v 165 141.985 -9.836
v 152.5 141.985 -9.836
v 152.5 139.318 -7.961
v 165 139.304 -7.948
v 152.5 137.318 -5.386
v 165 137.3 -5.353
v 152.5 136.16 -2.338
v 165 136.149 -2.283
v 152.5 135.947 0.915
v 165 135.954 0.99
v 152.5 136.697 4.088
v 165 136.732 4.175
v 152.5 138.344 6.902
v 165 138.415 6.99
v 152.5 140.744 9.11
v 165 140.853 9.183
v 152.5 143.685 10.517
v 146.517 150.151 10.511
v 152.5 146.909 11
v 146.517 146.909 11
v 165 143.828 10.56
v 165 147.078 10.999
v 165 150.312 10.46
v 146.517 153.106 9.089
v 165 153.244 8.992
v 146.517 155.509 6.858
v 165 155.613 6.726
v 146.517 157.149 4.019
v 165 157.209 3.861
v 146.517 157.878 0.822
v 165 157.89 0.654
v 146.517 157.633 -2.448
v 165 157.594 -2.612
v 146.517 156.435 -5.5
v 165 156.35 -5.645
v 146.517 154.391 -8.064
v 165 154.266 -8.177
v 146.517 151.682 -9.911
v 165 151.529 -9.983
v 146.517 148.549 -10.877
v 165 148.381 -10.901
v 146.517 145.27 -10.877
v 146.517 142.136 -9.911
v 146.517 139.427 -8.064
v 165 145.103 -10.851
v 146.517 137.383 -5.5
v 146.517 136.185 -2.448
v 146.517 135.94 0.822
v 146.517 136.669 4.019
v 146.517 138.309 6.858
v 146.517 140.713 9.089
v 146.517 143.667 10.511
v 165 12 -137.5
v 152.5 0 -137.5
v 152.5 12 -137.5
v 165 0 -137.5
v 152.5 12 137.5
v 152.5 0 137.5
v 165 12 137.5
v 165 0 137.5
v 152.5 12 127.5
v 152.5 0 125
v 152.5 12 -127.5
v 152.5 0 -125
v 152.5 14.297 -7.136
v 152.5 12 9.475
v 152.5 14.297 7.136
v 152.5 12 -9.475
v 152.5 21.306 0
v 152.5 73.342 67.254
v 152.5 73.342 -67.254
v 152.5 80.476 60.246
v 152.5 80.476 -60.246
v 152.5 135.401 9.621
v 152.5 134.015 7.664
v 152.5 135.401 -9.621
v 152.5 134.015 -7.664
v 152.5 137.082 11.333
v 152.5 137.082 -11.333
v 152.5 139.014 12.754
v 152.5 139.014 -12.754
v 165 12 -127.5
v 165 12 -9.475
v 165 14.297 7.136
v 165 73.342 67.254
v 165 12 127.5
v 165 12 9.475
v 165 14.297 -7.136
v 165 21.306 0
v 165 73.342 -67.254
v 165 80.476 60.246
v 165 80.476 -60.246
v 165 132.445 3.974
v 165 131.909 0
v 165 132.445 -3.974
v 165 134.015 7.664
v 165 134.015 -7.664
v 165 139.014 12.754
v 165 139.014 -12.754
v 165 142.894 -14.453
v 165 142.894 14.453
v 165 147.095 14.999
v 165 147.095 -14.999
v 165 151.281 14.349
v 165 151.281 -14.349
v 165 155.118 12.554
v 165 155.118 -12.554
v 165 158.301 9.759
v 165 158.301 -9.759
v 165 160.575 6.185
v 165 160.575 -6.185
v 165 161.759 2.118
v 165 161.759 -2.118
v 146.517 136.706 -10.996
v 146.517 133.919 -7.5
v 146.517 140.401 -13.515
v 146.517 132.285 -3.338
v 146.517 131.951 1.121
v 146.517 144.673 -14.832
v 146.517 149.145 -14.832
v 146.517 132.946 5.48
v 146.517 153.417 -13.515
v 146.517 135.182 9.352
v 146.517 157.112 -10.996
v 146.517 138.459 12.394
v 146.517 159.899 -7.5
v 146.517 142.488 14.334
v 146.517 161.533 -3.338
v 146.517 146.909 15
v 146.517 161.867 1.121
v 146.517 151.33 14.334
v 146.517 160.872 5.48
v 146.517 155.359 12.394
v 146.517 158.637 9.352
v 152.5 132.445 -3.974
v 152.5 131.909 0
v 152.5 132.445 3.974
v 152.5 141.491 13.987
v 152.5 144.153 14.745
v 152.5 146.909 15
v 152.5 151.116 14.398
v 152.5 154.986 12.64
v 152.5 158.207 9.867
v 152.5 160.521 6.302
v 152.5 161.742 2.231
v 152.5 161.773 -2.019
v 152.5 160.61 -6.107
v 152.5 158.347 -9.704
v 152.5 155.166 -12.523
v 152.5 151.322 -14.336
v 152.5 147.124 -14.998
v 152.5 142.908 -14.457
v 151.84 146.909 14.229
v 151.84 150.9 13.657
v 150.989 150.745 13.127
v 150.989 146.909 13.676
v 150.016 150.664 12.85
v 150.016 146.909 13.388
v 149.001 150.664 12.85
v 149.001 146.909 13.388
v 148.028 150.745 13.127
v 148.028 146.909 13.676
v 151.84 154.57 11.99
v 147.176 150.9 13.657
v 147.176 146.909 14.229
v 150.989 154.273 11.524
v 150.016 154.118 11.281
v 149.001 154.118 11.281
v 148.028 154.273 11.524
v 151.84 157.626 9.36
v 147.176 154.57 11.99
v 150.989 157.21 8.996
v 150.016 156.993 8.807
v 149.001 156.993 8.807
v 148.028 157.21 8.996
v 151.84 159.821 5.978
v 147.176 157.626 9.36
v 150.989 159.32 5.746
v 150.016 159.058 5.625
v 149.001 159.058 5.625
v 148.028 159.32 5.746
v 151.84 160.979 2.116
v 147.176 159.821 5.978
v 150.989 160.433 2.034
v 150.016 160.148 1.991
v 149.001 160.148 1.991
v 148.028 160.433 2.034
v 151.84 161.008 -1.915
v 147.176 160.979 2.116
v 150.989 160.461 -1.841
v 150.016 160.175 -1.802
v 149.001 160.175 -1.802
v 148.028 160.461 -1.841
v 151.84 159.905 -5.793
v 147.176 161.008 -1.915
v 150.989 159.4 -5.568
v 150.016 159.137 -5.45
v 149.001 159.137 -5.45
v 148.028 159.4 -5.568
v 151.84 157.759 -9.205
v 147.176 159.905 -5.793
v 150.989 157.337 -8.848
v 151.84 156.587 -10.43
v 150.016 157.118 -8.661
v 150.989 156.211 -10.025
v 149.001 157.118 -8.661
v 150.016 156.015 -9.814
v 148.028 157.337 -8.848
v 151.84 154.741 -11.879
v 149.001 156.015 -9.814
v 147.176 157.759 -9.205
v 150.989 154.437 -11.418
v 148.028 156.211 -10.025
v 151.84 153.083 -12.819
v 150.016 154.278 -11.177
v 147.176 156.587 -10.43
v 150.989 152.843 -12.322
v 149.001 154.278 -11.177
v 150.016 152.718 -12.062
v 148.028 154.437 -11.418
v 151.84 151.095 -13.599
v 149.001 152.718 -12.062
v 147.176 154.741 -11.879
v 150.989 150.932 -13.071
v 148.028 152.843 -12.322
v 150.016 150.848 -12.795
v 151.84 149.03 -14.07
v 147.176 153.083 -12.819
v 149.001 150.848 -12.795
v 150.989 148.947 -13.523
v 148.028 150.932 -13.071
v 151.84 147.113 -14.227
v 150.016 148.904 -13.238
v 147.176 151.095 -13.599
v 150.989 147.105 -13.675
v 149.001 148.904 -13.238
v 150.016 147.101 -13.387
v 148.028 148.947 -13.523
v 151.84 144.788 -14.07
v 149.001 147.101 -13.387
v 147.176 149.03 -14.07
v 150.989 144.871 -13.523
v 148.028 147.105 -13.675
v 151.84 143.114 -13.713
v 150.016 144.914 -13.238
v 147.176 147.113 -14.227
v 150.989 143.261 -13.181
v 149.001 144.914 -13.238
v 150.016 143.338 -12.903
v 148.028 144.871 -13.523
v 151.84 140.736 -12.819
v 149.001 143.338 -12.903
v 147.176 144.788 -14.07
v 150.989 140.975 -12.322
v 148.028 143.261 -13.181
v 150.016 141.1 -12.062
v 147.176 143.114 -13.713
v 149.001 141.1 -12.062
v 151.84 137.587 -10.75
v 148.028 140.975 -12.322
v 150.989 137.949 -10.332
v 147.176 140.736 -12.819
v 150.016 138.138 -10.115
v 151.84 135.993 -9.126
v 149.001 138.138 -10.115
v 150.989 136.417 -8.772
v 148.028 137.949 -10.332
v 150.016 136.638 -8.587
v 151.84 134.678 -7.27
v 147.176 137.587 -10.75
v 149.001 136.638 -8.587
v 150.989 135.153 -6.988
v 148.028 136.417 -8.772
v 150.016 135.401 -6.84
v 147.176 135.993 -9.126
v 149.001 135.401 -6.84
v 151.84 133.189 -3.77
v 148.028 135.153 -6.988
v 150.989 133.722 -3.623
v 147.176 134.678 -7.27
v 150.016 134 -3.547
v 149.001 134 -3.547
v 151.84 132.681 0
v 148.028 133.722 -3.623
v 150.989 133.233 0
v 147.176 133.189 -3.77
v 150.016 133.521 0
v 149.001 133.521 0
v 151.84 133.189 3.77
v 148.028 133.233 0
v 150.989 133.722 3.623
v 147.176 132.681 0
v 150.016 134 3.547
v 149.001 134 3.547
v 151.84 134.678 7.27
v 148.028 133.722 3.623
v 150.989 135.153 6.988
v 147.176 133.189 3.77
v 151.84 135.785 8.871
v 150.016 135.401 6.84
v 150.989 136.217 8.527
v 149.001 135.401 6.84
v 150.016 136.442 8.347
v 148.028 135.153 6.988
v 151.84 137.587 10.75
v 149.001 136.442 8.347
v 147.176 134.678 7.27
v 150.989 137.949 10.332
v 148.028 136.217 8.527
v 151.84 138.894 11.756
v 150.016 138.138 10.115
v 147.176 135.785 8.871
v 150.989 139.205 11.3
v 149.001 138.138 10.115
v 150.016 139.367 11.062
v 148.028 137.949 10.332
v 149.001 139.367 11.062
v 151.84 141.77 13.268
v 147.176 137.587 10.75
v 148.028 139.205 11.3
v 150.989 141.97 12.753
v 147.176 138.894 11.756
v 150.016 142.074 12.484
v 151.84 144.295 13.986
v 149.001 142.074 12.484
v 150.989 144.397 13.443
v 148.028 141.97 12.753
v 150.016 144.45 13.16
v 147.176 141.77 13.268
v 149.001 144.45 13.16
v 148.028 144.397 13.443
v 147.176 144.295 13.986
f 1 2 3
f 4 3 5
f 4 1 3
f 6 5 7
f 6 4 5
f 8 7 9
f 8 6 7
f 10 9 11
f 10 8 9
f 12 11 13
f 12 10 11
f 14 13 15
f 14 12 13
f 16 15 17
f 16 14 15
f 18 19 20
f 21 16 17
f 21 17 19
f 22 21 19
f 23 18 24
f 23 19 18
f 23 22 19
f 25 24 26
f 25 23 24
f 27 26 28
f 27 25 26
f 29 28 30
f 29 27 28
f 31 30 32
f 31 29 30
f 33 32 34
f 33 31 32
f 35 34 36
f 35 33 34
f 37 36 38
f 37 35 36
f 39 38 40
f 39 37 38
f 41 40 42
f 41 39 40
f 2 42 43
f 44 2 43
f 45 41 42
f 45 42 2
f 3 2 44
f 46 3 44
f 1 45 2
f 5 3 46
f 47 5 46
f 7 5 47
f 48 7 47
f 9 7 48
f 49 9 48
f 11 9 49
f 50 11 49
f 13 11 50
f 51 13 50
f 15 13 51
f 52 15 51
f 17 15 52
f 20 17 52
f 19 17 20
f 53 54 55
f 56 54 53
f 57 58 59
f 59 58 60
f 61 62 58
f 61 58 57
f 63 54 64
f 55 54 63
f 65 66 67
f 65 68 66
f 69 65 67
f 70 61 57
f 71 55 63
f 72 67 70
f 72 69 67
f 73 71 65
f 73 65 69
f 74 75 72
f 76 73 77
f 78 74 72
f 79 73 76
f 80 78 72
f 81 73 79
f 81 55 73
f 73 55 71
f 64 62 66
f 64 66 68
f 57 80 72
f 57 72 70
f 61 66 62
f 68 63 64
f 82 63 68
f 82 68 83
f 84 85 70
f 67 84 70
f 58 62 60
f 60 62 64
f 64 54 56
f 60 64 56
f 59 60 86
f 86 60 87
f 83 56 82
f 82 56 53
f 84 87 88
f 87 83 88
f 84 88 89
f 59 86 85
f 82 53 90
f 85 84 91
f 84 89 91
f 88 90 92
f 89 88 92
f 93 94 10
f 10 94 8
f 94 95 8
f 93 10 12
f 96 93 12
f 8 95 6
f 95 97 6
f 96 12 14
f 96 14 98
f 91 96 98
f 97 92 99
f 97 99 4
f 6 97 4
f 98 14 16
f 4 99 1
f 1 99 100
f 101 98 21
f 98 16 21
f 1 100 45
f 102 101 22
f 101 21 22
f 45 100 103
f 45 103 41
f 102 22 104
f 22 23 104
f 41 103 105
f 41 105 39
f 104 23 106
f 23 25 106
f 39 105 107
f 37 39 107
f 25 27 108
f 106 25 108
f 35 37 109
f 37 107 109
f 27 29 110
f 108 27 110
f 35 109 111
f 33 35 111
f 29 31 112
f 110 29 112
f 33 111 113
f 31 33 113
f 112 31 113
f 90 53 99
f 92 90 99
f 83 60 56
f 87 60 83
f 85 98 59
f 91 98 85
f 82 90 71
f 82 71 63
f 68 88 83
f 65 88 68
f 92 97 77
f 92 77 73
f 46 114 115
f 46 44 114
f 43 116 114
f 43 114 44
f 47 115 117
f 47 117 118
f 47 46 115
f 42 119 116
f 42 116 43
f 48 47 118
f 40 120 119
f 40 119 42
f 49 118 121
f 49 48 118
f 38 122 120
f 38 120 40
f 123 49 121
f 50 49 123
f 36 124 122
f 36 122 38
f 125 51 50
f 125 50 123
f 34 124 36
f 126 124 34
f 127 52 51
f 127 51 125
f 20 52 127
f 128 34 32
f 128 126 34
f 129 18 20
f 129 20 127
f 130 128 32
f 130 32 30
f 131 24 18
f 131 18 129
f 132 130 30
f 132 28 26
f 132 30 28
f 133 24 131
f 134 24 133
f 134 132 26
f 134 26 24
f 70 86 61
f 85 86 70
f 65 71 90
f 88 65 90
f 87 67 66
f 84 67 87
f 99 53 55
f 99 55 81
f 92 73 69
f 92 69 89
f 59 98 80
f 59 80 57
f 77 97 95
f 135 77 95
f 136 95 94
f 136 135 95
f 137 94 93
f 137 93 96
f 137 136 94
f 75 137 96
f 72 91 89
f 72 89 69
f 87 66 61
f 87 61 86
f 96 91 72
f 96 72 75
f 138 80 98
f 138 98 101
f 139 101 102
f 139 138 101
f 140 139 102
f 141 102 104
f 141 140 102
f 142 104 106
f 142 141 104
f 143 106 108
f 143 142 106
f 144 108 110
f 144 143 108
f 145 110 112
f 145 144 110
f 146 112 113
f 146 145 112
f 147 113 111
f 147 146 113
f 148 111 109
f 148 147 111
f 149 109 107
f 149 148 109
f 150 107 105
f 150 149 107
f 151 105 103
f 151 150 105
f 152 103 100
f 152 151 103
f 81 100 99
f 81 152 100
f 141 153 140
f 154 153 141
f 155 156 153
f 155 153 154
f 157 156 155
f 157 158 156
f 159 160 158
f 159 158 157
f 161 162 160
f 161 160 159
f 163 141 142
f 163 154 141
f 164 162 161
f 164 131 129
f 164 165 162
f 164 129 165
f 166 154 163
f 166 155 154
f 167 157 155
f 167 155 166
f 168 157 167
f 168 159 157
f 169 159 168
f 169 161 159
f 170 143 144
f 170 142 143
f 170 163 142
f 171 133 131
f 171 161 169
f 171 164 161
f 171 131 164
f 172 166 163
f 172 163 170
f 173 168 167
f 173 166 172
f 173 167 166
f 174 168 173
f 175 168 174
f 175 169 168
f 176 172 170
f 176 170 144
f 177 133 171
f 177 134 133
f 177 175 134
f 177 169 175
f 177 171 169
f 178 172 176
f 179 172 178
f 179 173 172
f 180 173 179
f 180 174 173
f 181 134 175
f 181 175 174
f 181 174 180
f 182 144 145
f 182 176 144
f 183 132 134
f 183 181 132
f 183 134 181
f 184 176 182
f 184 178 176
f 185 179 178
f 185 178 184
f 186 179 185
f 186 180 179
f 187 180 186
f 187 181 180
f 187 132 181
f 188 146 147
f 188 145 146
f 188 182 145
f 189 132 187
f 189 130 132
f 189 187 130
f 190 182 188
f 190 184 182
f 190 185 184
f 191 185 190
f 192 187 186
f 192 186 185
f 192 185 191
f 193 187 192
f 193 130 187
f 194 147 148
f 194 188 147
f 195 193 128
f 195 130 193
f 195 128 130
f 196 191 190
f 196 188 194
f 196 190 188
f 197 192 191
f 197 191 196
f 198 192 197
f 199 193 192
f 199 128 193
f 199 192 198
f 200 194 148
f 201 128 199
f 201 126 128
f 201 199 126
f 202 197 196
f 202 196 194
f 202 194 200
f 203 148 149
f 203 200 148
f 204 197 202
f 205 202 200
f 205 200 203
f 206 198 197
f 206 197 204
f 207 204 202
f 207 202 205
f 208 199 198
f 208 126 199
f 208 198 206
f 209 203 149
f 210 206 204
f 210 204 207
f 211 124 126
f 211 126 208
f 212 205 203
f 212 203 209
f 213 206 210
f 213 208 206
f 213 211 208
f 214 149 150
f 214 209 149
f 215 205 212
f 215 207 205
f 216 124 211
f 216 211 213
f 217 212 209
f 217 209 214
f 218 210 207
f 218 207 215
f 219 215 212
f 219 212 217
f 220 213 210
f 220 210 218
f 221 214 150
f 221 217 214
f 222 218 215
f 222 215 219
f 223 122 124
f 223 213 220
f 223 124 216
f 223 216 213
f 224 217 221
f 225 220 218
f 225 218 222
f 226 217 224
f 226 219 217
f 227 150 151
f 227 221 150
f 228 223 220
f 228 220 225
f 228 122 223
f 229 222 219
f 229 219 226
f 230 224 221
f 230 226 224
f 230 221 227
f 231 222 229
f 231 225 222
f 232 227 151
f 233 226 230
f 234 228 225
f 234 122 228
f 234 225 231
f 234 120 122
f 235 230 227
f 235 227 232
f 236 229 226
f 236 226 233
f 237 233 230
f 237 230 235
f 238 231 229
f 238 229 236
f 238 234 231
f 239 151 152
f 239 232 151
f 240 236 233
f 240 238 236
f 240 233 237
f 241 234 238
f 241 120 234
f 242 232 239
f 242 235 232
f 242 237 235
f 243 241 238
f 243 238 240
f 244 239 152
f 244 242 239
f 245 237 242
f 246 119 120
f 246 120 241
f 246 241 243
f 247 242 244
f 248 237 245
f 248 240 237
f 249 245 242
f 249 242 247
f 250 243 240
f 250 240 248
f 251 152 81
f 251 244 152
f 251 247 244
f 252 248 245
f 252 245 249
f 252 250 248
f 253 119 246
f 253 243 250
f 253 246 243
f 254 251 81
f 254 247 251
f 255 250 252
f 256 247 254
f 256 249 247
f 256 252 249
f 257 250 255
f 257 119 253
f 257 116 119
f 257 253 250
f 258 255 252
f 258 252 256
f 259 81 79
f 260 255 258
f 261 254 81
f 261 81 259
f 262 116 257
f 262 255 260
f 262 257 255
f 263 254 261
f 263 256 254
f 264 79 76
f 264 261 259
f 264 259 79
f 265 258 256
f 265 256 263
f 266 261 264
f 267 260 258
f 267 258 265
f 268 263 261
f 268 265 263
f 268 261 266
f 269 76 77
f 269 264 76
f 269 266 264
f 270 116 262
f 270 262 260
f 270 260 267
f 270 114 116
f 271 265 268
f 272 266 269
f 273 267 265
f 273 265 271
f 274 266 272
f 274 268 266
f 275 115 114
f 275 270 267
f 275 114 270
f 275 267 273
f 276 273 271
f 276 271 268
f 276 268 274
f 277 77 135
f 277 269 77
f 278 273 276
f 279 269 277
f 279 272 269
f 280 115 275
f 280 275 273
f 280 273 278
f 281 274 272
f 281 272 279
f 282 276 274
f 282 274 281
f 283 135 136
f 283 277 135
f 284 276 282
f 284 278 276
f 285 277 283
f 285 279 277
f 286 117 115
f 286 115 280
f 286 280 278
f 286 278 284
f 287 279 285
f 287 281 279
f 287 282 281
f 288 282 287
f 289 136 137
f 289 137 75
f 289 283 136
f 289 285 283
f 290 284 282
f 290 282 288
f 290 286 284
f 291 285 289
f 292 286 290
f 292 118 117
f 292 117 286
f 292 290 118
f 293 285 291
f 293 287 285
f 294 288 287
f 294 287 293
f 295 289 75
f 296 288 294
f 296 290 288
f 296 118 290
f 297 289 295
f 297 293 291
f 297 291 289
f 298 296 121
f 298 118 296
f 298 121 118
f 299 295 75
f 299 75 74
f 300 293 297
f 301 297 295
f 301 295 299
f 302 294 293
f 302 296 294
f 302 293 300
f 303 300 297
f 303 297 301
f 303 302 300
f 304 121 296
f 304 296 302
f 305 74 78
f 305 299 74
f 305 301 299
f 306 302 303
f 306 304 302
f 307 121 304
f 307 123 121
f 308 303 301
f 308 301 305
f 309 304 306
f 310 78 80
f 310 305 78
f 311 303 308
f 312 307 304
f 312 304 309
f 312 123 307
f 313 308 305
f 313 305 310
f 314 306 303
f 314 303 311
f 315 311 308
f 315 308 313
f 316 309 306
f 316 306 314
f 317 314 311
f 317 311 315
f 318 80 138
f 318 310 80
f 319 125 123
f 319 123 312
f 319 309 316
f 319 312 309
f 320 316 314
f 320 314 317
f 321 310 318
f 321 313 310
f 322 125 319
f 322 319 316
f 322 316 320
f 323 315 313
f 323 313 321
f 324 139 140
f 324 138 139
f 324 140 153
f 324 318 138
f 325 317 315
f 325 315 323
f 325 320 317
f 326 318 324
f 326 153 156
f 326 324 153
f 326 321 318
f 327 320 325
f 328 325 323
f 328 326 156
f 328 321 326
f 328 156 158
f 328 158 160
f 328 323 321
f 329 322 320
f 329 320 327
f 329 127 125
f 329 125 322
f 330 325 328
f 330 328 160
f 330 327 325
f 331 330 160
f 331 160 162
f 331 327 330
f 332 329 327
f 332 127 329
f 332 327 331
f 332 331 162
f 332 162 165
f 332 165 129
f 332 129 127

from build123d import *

# Parameters (mm, degrees)
SKETCH1_W               = 330
SKETCH1_H               = 275
SKETCH1_W_2             = 305
SKETCH1_H_2             = 250
BOSS_EXTRUDE4_DEPTH     = 12
BOSS_EXTRUDE6_DEPTH     = 12.5
BOSS_EXTRUDE7_DEPTH     = 12.5
SKETCH6_R               = 15
SKETCH6_R_2             = 11
BOSS_EXTRUDE8_DEPTH     = 12.5
SKETCH7_R               = 11
CUT_EXTRUDE2_DEPTH      = 383.003996993
BOSS_EXTRUDE9_REACH     = 283.371
SKETCH8_W               = 12.5
SKETCH8_H               = 10
BOSS_EXTRUDE10_REACH    = 283.371
SKETCH9_W               = 12.5
SKETCH9_H               = 10
SKETCH10_W              = 25
SKETCH10_H              = 25
BOSS_EXTRUDE11_DEPTH    = 12.5
SKETCH12_W              = 280.956709722
SKETCH12_H              = 169.506953284
CUT_EXTRUDE3_DEPTH      = 311
CUT_EXTRUDE4_DEPTH      = 12
CUT_EXTRUDE4_DEPTH_BACK = 6.5
SKETCH13_W              = 294.886301965
SKETCH13_H              = 76.884210059


with BuildPart() as part:
    # Sketch1 → Boss-Extrude4 (new body)
    with BuildSketch(Plane(origin=(0, 0, 0), x_dir=(1, 0, 0), z_dir=(0, 1, 0))):
        Rectangle(SKETCH1_W, SKETCH1_H)
        Rectangle(SKETCH1_W_2, SKETCH1_H_2, mode=Mode.SUBTRACT)
    extrude(amount=BOSS_EXTRUDE4_DEPTH)

    # Sketch2 → Boss-Extrude6 (add)
    with BuildSketch(Plane(origin=(165, 0, 0), x_dir=(0, 0, -1), z_dir=(1, 0, 0))):
        Polygon((0, 152), (-137.5, 12), (-127.5, 12), (0, 141.818181818), (127.5, 12), (137.5, 12), align=None)
    extrude(amount=-BOSS_EXTRUDE6_DEPTH)

    # Sketch5 → Boss-Extrude7 (add)
    with BuildSketch(Plane.ZY.offset(165)):
        Polygon((0, 152), (-137.5, 12), (-127.5, 12), (0, 141.818181818), (127.5, 12), (137.5, 12), align=None)
    extrude(amount=-BOSS_EXTRUDE7_DEPTH)

    # Sketch6 → Boss-Extrude8 (add)
    with BuildSketch(Plane.ZY.offset(-152.5)):
        with Locations((0, 146.909090909)):
            Circle(SKETCH6_R)
        with Locations((0, 146.909090909)):
            Circle(SKETCH6_R_2, mode=Mode.SUBTRACT)
    extrude(amount=-BOSS_EXTRUDE8_DEPTH)

    # Sketch7 → Cut-Extrude2 (cut, through all)
    with BuildSketch(Plane.ZY.offset(-152.5)):
        with Locations((0, 146.909090909)):
            Circle(SKETCH7_R)
    extrude(amount=-CUT_EXTRUDE2_DEPTH, mode=Mode.SUBTRACT)

    # Boss-Extrude9: up to this plane
    boss_extrude9_end = Plane(origin=(0, 12, 0), z_dir=(0, -1, 0))
    # Sketch8 → Boss-Extrude9 (add, up to the surface)
    with BuildSketch(Plane(origin=(0, 69.631553319, 70.897581561), x_dir=(-1, 0, 0), z_dir=(0, -0.7007080148842544, -0.7134481606094221)), mode=Mode.PRIVATE) as boss_extrude9_sk1:
        with Locations((-158.75, 10.200513494)):
            Rectangle(SKETCH8_W, SKETCH8_H)
    boss_extrude9_tool1 = split(extrude(boss_extrude9_sk1.sketch, amount=BOSS_EXTRUDE9_REACH, mode=Mode.PRIVATE), bisect_by=boss_extrude9_end, keep=Keep.BOTH, mode=Mode.PRIVATE)
    add(boss_extrude9_tool1.solids().sort_by_distance((158.75, 76.909091, 63.75))[0])
    # Sketch8 → Boss-Extrude9 (add, up to the surface)
    with BuildSketch(Plane(origin=(0, 69.631553319, 70.897581561), x_dir=(-1, 0, 0), z_dir=(0, -0.7007080148842544, -0.7134481606094221)), mode=Mode.PRIVATE) as boss_extrude9_sk2:
        with Locations((158.75, 10.200513494)):
            Rectangle(SKETCH8_W, SKETCH8_H)
    boss_extrude9_tool2 = split(extrude(boss_extrude9_sk2.sketch, amount=BOSS_EXTRUDE9_REACH, mode=Mode.PRIVATE), bisect_by=boss_extrude9_end, keep=Keep.BOTH, mode=Mode.PRIVATE)
    add(boss_extrude9_tool2.solids().sort_by_distance((-158.75, 76.909091, 63.75))[0])

    # Boss-Extrude10: up to this plane
    boss_extrude10_end = Plane(origin=(0, 12, 0), z_dir=(0, -1, 0))
    # Sketch9 → Boss-Extrude10 (add, up to the surface)
    with BuildSketch(Plane(origin=(0, 69.631553319, -70.897581561), x_dir=(1, 0, 0), z_dir=(0, -0.7007080148842544, 0.7134481606094221)), mode=Mode.PRIVATE) as boss_extrude10_sk1:
        with Locations((-158.75, 10.200513494)):
            Rectangle(SKETCH9_W, SKETCH9_H)
    boss_extrude10_tool1 = split(extrude(boss_extrude10_sk1.sketch, amount=BOSS_EXTRUDE10_REACH, mode=Mode.PRIVATE), bisect_by=boss_extrude10_end, keep=Keep.BOTH, mode=Mode.PRIVATE)
    add(boss_extrude10_tool1.solids().sort_by_distance((-158.75, 76.909091, -63.75))[0])
    # Sketch9 → Boss-Extrude10 (add, up to the surface)
    with BuildSketch(Plane(origin=(0, 69.631553319, -70.897581561), x_dir=(1, 0, 0), z_dir=(0, -0.7007080148842544, 0.7134481606094221)), mode=Mode.PRIVATE) as boss_extrude10_sk2:
        with Locations((158.75, 10.200513494)):
            Rectangle(SKETCH9_W, SKETCH9_H)
    boss_extrude10_tool2 = split(extrude(boss_extrude10_sk2.sketch, amount=BOSS_EXTRUDE10_REACH, mode=Mode.PRIVATE), bisect_by=boss_extrude10_end, keep=Keep.BOTH, mode=Mode.PRIVATE)
    add(boss_extrude10_tool2.solids().sort_by_distance((158.75, 76.909091, -63.75))[0])

    # Sketch10 → Boss-Extrude11 (add)
    with BuildSketch(Plane(origin=(-152.5, 0, 0), x_dir=(0, 0, -1), z_dir=(1, 0, 0))):
        with Locations((0, 146.909090909)):
            Rectangle(SKETCH10_W, SKETCH10_H)
    extrude(amount=-BOSS_EXTRUDE11_DEPTH)

    # Sketch11 → Revolve1 (revolve)
    with BuildSketch(Plane.XY, mode=Mode.PRIVATE) as revolve1_sk:
        with BuildLine():
            Line((152.5, 157.909090909), (152.5, 161.909090909))
            ThreePointArc((152.5, 161.909090909), (149.508436085, 160.260408588), (146.516872171, 161.909090909))
            Line((146.516872171, 161.909090909), (146.516872171, 157.909090909))
            Line((146.516872171, 157.909090909), (152.5, 157.909090909))
        make_face()
    revolve(revolve1_sk.sketch.rotate(Axis((152.5, 146.909090909, 0), (-1, 0, 0)), 270), axis=Axis((152.5, 146.909090909, 0), (-1, 0, 0)))

    # Sketch12 → Cut-Extrude3 (cut)
    with BuildSketch(Plane.ZY.offset(165)):
        with Locations((2.978354861, 84.753476642)):
            Rectangle(SKETCH12_W, SKETCH12_H)
    extrude(amount=-CUT_EXTRUDE3_DEPTH, mode=Mode.SUBTRACT)

    # Sketch13 → Cut-Extrude4 (cut, two sides: drawn at the far end of the back side and taken through both)
    with BuildSketch(Plane.ZY.offset(-146).offset(-CUT_EXTRUDE4_DEPTH_BACK)):
        with Locations((9.943150983, 38.44210503)):
            Rectangle(SKETCH13_W, SKETCH13_H)
    extrude(amount=CUT_EXTRUDE4_DEPTH + CUT_EXTRUDE4_DEPTH_BACK, mode=Mode.SUBTRACT)


solid = part.part
